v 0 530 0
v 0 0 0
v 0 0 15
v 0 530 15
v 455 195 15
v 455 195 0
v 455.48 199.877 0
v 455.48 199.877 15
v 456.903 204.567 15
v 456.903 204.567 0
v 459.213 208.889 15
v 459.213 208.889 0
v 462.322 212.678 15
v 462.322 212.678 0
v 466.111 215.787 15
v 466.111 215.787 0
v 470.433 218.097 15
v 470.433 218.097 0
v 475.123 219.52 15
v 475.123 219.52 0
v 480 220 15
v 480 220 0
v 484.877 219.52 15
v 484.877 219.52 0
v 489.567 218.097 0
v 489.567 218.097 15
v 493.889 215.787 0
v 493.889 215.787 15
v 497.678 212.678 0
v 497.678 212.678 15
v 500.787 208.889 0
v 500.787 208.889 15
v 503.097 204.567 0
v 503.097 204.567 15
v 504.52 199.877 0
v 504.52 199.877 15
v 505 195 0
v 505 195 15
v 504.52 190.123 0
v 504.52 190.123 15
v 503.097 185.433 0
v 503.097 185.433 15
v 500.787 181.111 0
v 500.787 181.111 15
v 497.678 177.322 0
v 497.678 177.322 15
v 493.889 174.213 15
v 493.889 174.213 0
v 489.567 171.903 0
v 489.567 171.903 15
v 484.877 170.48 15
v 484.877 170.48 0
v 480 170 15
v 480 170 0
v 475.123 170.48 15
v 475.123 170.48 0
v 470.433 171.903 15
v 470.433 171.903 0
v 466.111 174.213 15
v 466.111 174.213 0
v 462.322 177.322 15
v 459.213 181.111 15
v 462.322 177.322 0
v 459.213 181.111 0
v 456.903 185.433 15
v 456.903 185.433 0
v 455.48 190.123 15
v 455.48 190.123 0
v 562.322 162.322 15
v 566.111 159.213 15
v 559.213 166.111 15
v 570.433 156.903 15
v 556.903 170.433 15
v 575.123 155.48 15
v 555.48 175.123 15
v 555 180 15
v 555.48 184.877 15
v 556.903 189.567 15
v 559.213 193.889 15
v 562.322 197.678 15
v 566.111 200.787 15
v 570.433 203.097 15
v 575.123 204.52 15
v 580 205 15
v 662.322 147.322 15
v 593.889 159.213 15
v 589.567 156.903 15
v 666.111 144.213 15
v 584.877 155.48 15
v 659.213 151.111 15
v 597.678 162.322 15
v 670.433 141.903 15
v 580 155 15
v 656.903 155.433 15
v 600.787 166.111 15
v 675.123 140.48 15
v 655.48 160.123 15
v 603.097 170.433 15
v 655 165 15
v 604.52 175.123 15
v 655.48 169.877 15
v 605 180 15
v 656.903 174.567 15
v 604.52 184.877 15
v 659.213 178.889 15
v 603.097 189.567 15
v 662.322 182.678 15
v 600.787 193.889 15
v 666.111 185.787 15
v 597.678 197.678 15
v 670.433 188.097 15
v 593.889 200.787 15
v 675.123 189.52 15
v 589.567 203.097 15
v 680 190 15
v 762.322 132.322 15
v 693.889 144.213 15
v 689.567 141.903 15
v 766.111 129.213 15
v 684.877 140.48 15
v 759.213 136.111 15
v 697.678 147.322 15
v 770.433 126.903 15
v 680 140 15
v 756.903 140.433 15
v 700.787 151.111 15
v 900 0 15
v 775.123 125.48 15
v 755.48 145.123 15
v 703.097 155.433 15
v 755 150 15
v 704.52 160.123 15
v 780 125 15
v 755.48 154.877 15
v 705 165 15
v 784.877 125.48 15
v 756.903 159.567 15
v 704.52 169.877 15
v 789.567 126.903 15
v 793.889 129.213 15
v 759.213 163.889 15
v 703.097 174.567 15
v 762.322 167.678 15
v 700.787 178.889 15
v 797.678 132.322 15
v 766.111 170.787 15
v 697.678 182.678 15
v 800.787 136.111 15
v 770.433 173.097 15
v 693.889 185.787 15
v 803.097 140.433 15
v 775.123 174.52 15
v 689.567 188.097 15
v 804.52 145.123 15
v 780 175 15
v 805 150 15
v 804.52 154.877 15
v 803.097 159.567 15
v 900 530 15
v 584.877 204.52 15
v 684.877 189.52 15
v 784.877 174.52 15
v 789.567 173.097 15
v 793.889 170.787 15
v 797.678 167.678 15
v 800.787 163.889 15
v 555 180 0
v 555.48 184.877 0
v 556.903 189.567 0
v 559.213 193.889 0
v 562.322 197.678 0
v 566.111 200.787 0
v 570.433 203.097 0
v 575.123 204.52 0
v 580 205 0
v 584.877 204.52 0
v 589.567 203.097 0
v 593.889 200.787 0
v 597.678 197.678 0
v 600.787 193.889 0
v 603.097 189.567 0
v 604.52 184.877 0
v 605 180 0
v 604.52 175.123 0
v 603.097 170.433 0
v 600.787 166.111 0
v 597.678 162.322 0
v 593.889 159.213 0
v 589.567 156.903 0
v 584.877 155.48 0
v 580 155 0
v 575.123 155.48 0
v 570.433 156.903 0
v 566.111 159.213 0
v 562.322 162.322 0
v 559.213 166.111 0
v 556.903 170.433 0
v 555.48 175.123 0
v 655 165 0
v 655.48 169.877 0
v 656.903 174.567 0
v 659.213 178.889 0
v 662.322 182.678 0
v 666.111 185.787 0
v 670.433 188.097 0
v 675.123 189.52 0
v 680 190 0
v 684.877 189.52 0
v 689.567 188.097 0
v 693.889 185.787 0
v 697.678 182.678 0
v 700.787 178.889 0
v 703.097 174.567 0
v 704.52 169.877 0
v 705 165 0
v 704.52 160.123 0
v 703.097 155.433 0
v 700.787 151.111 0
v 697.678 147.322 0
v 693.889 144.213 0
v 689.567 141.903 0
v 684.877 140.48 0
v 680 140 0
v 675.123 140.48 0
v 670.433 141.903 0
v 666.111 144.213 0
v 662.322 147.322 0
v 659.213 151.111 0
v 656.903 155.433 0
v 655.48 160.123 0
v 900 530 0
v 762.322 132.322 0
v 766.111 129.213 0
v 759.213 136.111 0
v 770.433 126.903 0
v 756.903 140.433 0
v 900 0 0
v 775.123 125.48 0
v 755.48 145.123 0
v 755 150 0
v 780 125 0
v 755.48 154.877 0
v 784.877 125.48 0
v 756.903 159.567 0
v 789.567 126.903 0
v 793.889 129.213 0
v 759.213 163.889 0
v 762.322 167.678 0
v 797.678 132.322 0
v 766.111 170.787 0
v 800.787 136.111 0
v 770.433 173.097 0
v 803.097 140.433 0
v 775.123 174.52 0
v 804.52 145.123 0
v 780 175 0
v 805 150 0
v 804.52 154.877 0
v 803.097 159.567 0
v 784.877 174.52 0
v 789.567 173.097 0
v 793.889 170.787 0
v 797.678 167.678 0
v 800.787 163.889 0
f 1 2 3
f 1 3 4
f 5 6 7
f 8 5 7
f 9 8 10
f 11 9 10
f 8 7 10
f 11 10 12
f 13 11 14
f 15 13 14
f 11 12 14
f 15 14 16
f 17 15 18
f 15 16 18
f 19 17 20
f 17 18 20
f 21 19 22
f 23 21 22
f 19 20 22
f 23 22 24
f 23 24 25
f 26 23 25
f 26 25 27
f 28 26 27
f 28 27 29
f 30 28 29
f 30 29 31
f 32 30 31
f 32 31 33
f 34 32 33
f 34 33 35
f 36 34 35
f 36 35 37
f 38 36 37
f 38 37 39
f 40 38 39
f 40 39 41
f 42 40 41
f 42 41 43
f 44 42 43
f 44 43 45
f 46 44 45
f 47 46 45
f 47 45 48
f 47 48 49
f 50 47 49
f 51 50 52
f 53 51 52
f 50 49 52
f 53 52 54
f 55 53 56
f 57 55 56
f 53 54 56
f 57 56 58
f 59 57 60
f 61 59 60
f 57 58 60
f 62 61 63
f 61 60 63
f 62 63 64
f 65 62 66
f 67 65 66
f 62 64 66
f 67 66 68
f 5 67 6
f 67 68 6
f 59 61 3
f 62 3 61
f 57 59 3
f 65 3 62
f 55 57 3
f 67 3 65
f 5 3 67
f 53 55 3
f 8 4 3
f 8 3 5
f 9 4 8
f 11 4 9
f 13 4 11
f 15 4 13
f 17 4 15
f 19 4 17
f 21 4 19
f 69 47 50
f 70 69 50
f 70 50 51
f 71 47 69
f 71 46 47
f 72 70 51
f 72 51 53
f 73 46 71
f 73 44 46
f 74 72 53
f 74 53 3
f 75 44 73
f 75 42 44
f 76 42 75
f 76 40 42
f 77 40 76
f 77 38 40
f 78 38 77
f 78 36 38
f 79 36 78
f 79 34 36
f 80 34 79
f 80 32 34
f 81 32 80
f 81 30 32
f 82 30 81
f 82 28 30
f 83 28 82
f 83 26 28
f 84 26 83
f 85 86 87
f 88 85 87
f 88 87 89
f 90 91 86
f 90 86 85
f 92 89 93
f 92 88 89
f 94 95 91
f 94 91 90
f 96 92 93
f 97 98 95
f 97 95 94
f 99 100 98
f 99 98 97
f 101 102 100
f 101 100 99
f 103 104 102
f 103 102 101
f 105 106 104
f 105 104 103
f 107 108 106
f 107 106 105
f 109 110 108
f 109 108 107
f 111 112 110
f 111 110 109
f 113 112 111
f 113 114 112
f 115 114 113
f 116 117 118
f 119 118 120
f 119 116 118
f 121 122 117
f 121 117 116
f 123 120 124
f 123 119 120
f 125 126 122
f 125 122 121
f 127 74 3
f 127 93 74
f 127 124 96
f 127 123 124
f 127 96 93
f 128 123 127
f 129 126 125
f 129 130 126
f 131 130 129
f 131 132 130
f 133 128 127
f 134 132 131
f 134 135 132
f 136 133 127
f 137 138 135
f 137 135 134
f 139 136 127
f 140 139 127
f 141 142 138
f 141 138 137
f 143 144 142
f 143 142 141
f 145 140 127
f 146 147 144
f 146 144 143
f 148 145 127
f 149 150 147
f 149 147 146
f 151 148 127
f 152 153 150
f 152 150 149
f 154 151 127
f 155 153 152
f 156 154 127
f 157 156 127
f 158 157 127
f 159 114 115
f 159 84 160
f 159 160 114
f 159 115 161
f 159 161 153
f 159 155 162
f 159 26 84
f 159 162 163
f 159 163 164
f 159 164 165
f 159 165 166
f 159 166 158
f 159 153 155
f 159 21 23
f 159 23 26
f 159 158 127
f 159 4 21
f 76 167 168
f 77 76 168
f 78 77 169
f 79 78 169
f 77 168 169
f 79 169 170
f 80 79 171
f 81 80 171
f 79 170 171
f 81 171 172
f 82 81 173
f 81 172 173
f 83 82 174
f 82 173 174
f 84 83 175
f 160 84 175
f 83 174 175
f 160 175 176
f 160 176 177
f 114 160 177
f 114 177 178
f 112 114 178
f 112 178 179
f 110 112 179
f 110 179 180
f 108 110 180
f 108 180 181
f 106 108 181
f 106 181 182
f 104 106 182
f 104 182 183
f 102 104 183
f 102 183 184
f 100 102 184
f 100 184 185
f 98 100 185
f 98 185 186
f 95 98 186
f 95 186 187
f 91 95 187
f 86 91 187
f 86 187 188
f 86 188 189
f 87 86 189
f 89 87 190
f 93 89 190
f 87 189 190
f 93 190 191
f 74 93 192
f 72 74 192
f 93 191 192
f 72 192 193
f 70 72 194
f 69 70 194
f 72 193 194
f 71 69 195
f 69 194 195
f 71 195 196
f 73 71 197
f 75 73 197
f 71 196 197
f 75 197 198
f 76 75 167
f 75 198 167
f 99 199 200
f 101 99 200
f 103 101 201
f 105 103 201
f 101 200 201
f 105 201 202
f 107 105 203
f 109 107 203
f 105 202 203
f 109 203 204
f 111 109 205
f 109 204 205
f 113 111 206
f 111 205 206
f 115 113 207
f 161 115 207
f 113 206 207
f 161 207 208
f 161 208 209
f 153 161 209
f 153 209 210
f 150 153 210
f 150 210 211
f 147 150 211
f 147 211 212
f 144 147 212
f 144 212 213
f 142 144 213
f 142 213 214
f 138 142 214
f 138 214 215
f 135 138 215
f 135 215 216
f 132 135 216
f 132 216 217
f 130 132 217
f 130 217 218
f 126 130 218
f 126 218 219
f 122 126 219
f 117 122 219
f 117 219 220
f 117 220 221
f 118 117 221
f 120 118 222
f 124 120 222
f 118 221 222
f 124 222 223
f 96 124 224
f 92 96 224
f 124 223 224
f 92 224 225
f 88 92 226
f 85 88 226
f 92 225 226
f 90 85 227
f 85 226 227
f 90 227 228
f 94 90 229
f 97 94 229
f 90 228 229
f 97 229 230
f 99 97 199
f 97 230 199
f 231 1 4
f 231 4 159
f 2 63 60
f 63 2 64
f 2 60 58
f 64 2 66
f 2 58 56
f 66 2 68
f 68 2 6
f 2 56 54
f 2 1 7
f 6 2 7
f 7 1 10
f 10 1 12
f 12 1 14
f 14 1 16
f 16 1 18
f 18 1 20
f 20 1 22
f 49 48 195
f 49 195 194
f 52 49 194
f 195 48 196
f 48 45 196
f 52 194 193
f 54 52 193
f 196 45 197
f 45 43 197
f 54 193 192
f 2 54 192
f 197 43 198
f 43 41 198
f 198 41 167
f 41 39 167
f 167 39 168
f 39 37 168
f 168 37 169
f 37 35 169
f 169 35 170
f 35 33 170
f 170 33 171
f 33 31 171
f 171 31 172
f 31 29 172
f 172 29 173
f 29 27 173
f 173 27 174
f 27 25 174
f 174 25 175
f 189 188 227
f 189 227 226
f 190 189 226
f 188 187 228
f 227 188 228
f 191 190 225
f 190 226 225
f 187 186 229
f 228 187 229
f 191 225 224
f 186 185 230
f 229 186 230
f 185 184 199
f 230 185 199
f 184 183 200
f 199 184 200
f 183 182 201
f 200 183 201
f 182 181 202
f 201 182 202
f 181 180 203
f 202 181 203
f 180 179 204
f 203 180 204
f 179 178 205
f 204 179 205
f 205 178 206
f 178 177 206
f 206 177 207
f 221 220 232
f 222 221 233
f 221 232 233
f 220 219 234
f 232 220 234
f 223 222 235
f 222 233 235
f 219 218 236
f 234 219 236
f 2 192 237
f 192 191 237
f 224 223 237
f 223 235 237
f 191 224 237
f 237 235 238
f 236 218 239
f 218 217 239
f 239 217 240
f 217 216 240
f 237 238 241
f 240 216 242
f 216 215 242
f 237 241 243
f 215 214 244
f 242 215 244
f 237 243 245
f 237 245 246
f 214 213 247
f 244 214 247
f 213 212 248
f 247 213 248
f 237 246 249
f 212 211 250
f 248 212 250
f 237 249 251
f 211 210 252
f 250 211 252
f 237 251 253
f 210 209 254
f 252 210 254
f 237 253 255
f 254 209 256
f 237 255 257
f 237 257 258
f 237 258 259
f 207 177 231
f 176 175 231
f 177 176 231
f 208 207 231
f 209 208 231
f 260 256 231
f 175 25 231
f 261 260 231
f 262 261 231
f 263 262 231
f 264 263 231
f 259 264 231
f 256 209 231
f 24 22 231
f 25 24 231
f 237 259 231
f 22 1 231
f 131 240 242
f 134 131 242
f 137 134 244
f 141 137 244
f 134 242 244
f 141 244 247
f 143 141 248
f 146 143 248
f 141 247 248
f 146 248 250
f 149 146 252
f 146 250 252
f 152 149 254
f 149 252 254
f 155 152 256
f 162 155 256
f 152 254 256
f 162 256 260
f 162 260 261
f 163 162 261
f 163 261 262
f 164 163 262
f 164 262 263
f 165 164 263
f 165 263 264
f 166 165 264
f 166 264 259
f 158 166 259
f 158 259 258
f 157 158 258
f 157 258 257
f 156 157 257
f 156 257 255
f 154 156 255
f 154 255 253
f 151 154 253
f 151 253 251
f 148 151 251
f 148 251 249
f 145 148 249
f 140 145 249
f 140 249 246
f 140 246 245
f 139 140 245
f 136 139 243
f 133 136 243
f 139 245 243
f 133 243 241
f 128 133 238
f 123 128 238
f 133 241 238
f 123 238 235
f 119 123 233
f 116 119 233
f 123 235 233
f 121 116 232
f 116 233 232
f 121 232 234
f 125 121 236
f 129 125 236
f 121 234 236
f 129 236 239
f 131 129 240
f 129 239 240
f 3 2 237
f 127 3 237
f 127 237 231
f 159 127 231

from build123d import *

# Parameters (mm, degrees)
SKETCH1_W           = 900
SKETCH1_H           = 530
BOSS_EXTRUDE1_DEPTH = 15
SKETCH3_R           = 25
CUT_EXTRUDE1_DEPTH  = 16


with BuildPart() as part:
    # Sketch1 → Boss-Extrude1 (new body)
    with BuildSketch(Plane.XY):
        with Locations((450, 265)):
            Rectangle(SKETCH1_W, SKETCH1_H)
    extrude(amount=BOSS_EXTRUDE1_DEPTH)

    # Sketch3 → Cut-Extrude1 (cut, through all)
    with BuildSketch(Plane(origin=(0, 0, 0), x_dir=(-1, 0, 0), z_dir=(0, 0, -1))):
        with Locations((-780, 150)):
            Circle(SKETCH3_R)
        with Locations((-680, 165)):
            Circle(SKETCH3_R)
        with Locations((-580, 180)):
            Circle(SKETCH3_R)
        with Locations((-480, 195)):
            Circle(SKETCH3_R)
    extrude(amount=-CUT_EXTRUDE1_DEPTH, mode=Mode.SUBTRACT)


solid = part.part
